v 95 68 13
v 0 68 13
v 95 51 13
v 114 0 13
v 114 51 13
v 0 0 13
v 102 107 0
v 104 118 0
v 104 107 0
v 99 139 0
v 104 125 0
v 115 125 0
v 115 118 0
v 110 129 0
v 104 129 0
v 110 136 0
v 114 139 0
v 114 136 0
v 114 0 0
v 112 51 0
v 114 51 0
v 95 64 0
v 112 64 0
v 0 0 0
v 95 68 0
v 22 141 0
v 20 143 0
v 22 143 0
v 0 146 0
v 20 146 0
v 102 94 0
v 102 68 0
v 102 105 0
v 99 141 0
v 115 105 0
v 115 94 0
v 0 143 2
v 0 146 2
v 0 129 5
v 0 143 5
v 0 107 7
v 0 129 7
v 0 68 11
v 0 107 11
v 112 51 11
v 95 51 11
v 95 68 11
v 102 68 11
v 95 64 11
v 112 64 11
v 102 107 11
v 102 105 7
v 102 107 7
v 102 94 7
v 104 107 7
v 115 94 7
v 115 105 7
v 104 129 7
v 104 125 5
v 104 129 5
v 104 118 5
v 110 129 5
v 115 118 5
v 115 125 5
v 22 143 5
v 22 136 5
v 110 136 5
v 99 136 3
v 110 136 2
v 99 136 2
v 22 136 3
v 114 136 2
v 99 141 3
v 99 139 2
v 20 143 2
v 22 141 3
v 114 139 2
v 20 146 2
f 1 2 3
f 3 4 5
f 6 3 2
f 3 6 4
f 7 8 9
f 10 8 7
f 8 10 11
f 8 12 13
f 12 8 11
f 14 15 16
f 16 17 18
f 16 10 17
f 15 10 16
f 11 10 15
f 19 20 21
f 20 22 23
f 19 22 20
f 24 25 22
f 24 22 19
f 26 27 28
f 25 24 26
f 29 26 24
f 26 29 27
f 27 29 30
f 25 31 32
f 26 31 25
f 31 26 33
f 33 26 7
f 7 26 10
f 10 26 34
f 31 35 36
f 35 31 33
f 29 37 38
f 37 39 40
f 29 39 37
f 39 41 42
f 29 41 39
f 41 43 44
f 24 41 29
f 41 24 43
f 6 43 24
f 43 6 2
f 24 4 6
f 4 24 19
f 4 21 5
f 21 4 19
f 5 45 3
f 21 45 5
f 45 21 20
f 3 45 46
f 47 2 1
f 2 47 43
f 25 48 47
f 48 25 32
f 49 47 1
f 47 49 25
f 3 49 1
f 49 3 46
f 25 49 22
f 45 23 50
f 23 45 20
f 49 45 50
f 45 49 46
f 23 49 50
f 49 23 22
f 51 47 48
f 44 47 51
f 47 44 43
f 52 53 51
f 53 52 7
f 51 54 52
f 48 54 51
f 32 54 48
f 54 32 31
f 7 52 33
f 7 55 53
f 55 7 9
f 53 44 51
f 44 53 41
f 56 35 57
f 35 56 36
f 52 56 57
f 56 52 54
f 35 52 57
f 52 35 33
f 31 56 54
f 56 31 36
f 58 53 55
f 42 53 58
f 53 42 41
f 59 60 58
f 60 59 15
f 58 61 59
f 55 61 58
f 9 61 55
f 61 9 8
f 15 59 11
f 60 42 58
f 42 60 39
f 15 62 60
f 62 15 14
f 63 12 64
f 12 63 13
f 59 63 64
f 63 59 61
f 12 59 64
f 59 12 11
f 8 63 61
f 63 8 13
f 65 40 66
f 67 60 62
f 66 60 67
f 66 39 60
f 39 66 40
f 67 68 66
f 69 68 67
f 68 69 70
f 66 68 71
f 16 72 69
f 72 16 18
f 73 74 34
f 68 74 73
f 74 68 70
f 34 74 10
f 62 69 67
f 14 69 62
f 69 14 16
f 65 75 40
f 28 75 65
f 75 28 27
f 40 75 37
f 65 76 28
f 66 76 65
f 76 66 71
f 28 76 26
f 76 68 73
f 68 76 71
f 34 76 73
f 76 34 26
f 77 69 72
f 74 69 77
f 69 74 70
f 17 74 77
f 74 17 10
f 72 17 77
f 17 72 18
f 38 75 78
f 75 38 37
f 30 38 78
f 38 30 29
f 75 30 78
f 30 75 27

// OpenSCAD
translate([9.5, 8.5, 6.5]) color([0.40341287658681757, 0.7785502590540477, 0.7881774252549901]) cube([19, 17, 13], center=true);
translate([28.5, 8.5, 6.5]) color([0.29225416811082217, 0.37180432355577453, 0.6288109059468862]) cube([19, 17, 13], center=true);
translate([47.5, 8.5, 6.5]) color([0.15706996711565713, 0.6970319309869248, 0.3814277529807131]) cube([19, 17, 13], center=true);
translate([66.5, 8.5, 6.5]) color([0.591062474757007, 0.1395330992312218, 0.6682583860975598]) cube([19, 17, 13], center=true);
translate([85.5, 8.5, 6.5]) color([0.3540578606136997, 0.4726655762072315, 0.4151074008495357]) cube([19, 17, 13], center=true);
translate([104.5, 8.5, 6.5]) color([0.47671524799509457, 0.6946956329164442, 0.31824017683207795]) cube([19, 17, 13], center=true);
translate([9.5, 25.5, 6.5]) color([0.6520544808985483, 0.060222107499701916, 0.3001851524622099]) cube([19, 17, 13], center=true);
translate([28.5, 25.5, 6.5]) color([0.7452096901500458, 0.05240587806206365, 0.6211421952822352]) cube([19, 17, 13], center=true);
translate([47.5, 25.5, 6.5]) color([0.025546799267838538, 0.4715288683099005, 0.8885450437134765]) cube([19, 17, 13], center=true);
translate([66.5, 25.5, 6.5]) color([0.010110093997603875, 0.5268280206539229, 0.06645682965886301]) cube([19, 17, 13], center=true);
translate([85.5, 25.5, 6.5]) color([0.8671097761494883, 0.6862965222396646, 0.7419538566814291]) cube([19, 17, 13], center=true);
translate([104.5, 25.5, 6.5]) color([0.669007579945888, 0.006423453698145676, 0.041177862257898545]) cube([19, 17, 13], center=true);
translate([9.5, 42.5, 6.5]) color([0.6208768040220466, 0.9996851255769114, 0.8731472390917929]) cube([19, 17, 13], center=true);
translate([28.5, 42.5, 6.5]) color([0.699685806725371, 0.7270999543422898, 0.2266870226016624]) cube([19, 17, 13], center=true);
translate([47.5, 42.5, 6.5]) color([0.751613934135812, 0.28792410486343756, 0.10546026702239297]) cube([19, 17, 13], center=true);
translate([66.5, 42.5, 6.5]) color([0.4608948954667579, 0.33019577252961807, 0.168255398651179]) cube([19, 17, 13], center=true);
translate([85.5, 42.5, 6.5]) color([0.42170989251140467, 0.8972009769638755, 0.4352702732981688]) cube([19, 17, 13], center=true);
translate([104.5, 42.5, 6.5]) color([0.4472918952497248, 0.708827757444238, 0.5241618701522923]) cube([19, 17, 13], center=true);
translate([9.5, 59.5, 6.5]) color([0.12922303534199353, 0.91039239754397, 0.4441243361619651]) cube([19, 17, 13], center=true);
translate([28.5, 59.5, 6.5]) color([0.7893377392253591, 0.38887513002224416, 0.806846018820692]) cube([19, 17, 13], center=true);
translate([47.5, 59.5, 6.5]) color([0.3895364160074527, 0.2201595216660458, 0.19619466691666865]) cube([19, 17, 13], center=true);
translate([66.5, 59.5, 6.5]) color([0.9400346443375104, 0.58653025858102, 0.04979326505826487]) cube([19, 17, 13], center=true);
translate([85.5, 59.5, 6.5]) color([0.38834759617804915, 0.234029260524927, 0.08465706460929934]) cube([19, 17, 13], center=true);
translate([103.5, 57.5, 5.5]) color([0.18675586852140846, 0.05699047999950346, 0.6380736282281027]) cube([17, 13, 11], center=true);
translate([8.5, 74.5, 5.5]) color([0.17337386483746886, 0.6107798762435255, 0.6125067478912297]) cube([17, 13, 11], center=true);
translate([25.5, 74.5, 5.5]) color([0.7049237107399368, 0.5121186506114312, 0.28442399033479826]) cube([17, 13, 11], center=true);
translate([42.5, 74.5, 5.5]) color([0.8774574539285279, 0.35307108172351365, 0.4582943249787391]) cube([17, 13, 11], center=true);
translate([59.5, 74.5, 5.5]) color([0.6318794317305464, 0.5161242981674495, 0.9564683485665337]) cube([17, 13, 11], center=true);
translate([76.5, 74.5, 5.5]) color([0.9547176774381221, 0.9297598506094263, 0.9340763496652581]) cube([17, 13, 11], center=true);
translate([93.5, 74.5, 5.5]) color([0.580960135568696, 0.49020206373000297, 0.7041168173823689]) cube([17, 13, 11], center=true);
translate([8.5, 87.5, 5.5]) color([0.21541959298546798, 0.26587203921552827, 0.04380725363309168]) cube([17, 13, 11], center=true);
translate([25.5, 87.5, 5.5]) color([0.16285754255803098, 0.0038745499388105342, 0.6546275765234981]) cube([17, 13, 11], center=true);
translate([42.5, 87.5, 5.5]) color([0.14040698903568194, 0.7866793455760521, 0.680503995881725]) cube([17, 13, 11], center=true);
translate([59.5, 87.5, 5.5]) color([0.9706757933544957, 0.3965144869518913, 0.9213919134510528]) cube([17, 13, 11], center=true);
translate([76.5, 87.5, 5.5]) color([0.4537041723195332, 0.3395037398362071, 0.10233886991705377]) cube([17, 13, 11], center=true);
translate([93.5, 87.5, 5.5]) color([0.8828321850718597, 0.7947901585625868, 0.3229289765350606]) cube([17, 13, 11], center=true);
translate([8.5, 100.5, 5.5]) color([0.45574438492562896, 0.32514346581324827, 0.028829116538094723]) cube([17, 13, 11], center=true);
translate([25.5, 100.5, 5.5]) color([0.04435252539911694, 0.3687041258820589, 0.20959132812878367]) cube([17, 13, 11], center=true);
translate([42.5, 100.5, 5.5]) color([0.5245146032105923, 0.1877850356496189, 0.2016215864664097]) cube([17, 13, 11], center=true);
translate([59.5, 100.5, 5.5]) color([0.6726678813176303, 0.7356026567617159, 0.31223209587410494]) cube([17, 13, 11], center=true);
translate([76.5, 100.5, 5.5]) color([0.8599943994333726, 0.2546391746557106, 0.34394037628155716]) cube([17, 13, 11], center=true);
translate([93.5, 100.5, 5.5]) color([0.712480390369609, 0.04450290132920964, 0.934183460116191]) cube([17, 13, 11], center=true);
translate([108.5, 99.5, 3.5]) color([0.07233773178762537, 0.4609310589380602, 0.7246048259600892]) cube([13, 11, 7], center=true);
translate([6.5, 112.5, 3.5]) color([0.04746853498479808, 0.8090026856371774, 0.9788933433114139]) cube([13, 11, 7], center=true);
translate([19.5, 112.5, 3.5]) color([0.460511672795628, 0.11812363628756806, 0.08147699565547994]) cube([13, 11, 7], center=true);
translate([32.5, 112.5, 3.5]) color([0.09873043616313526, 0.7654413741364753, 0.4140128484685186]) cube([13, 11, 7], center=true);
translate([45.5, 112.5, 3.5]) color([0.9192341581990311, 0.4406397760864845, 0.07714331014460807]) cube([13, 11, 7], center=true);
translate([58.5, 112.5, 3.5]) color([0.42693558751800065, 0.7548278934255565, 0.8293384268467949]) cube([13, 11, 7], center=true);
translate([71.5, 112.5, 3.5]) color([0.039351686529191854, 0.1803893912563338, 0.490013452023644]) cube([13, 11, 7], center=true);
translate([84.5, 112.5, 3.5]) color([0.12808547795160863, 0.8710926419421733, 0.9344608884461488]) cube([13, 11, 7], center=true);
translate([97.5, 112.5, 3.5]) color([0.3195969983538176, 0.43484368255202, 0.5570540644200566]) cube([13, 11, 7], center=true);
translate([6.5, 123.5, 3.5]) color([0.2855057910835891, 0.5410756974595614, 0.2011850454737838]) cube([13, 11, 7], center=true);
translate([19.5, 123.5, 3.5]) color([0.2966412512769129, 0.44178363318767744, 0.604669902191143]) cube([13, 11, 7], center=true);
translate([32.5, 123.5, 3.5]) color([0.5361650260862432, 0.2609879767339395, 0.23178787541805523]) cube([13, 11, 7], center=true);
translate([45.5, 123.5, 3.5]) color([0.11873023670071103, 0.7834936358921726, 0.09890076646638046]) cube([13, 11, 7], center=true);
translate([58.5, 123.5, 3.5]) color([0.7328850061793606, 0.2487736956630997, 0.28455698400578255]) cube([13, 11, 7], center=true);
translate([71.5, 123.5, 3.5]) color([0.7360834330107994, 0.6596207917216363, 0.7419215555155583]) cube([13, 11, 7], center=true);
translate([84.5, 123.5, 3.5]) color([0.5152830587943614, 0.8590958196652707, 0.12179389137547159]) cube([13, 11, 7], center=true);
translate([97.5, 123.5, 3.5]) color([0.6451969614065052, 0.11824431248865597, 0.7372833681454282]) cube([13, 11, 7], center=true);
translate([109.5, 121.5, 2.5]) color([0.3589046614584527, 0.67488210437111, 0.7034839134412817]) cube([11, 7, 5], center=true);
translate([5.5, 132.5, 2.5]) color([0.6606084576410584, 0.22155798032782648, 0.8317998863873537]) cube([11, 7, 5], center=true);
translate([16.5, 132.5, 2.5]) color([0.24013608742346748, 0.5181532972121122, 0.6746457541533513]) cube([11, 7, 5], center=true);
translate([27.5, 132.5, 2.5]) color([0.23360317478475656, 0.628511722983939, 0.2868310479973286]) cube([11, 7, 5], center=true);
translate([38.5, 132.5, 2.5]) color([0.1713823760843869, 0.809748828526577, 0.5531227700773604]) cube([11, 7, 5], center=true);
translate([49.5, 132.5, 2.5]) color([0.32788470660885605, 0.5854309472055399, 0.025286397427288332]) cube([11, 7, 5], center=true);
translate([60.5, 132.5, 2.5]) color([0.12982285676032723, 0.3955808516982431, 0.9757565794644123]) cube([11, 7, 5], center=true);
translate([71.5, 132.5, 2.5]) color([0.5104745178761232, 0.07645620506689521, 0.7650406152494567]) cube([11, 7, 5], center=true);
translate([82.5, 132.5, 2.5]) color([0.7814438709253152, 0.7748021743948562, 0.5694980380479538]) cube([11, 7, 5], center=true);
translate([93.5, 132.5, 2.5]) color([0.6956987378694627, 0.21345793631163135, 0.7325605908939883]) cube([11, 7, 5], center=true);
translate([104.5, 132.5, 2.5]) color([0.8161739873415944, 0.7599665402219192, 0.353462402585887]) cube([11, 7, 5], center=true);
translate([5.5, 139.5, 2.5]) color([0.5910280505757086, 0.6289893574898388, 0.9008098536570839]) cube([11, 7, 5], center=true);
translate([16.5, 139.5, 2.5]) color([0.1080138952733335, 0.8339337708504084, 0.5264355584690392]) cube([11, 7, 5], center=true);
translate([25.5, 138.5, 1.5]) color([0.3586141205519373, 0.4556029014937524, 0.012635498930738787]) cube([7, 5, 3], center=true);
translate([32.5, 138.5, 1.5]) color([0.22007359233142765, 0.6527634200680049, 0.660849279754449]) cube([7, 5, 3], center=true);
translate([39.5, 138.5, 1.5]) color([0.4946989402863131, 0.9533258805973196, 0.4809150885494712]) cube([7, 5, 3], center=true);
translate([46.5, 138.5, 1.5]) color([0.3139436595456605, 0.8477808391956414, 0.259158299397262]) cube([7, 5, 3], center=true);
translate([53.5, 138.5, 1.5]) color([0.6043059930343495, 0.7034188523223, 0.8216962986917842]) cube([7, 5, 3], center=true);
translate([60.5, 138.5, 1.5]) color([0.7853687501827489, 0.3840923305137113, 0.059180305962736934]) cube([7, 5, 3], center=true);
translate([67.5, 138.5, 1.5]) color([0.03828786548344276, 0.7264603879084595, 0.9616913814068508]) cube([7, 5, 3], center=true);
translate([74.5, 138.5, 1.5]) color([0.3431653742712939, 0.44119509807551416, 0.7257980157417766]) cube([7, 5, 3], center=true);
translate([81.5, 138.5, 1.5]) color([0.6578312458538799, 0.26010658848413604, 0.6715848457987025]) cube([7, 5, 3], center=true);
translate([88.5, 138.5, 1.5]) color([0.3049024195743838, 0.3563579065620385, 0.5395133052630944]) cube([7, 5, 3], center=true);
translate([95.5, 138.5, 1.5]) color([0.7323138239267305, 0.15121621156796483, 0.021987210892938758]) cube([7, 5, 3], center=true);
translate([101.5, 137.5, 1.0]) color([0.6278299544850219, 0.024564677785836264, 0.04496324071616853]) cube([5, 3, 2], center=true);
translate([106.5, 137.5, 1.0]) color([0.22577557672213355, 0.6538768733044555, 0.06654509768602879]) cube([5, 3, 2], center=true);
translate([111.5, 137.5, 1.0]) color([0.06240576762652772, 0.9720932443736168, 0.4226528937805498]) cube([5, 3, 2], center=true);
translate([2.5, 144.5, 1.0]) color([0.8924289339928592, 0.21652428395276402, 0.4352131794546169]) cube([5, 3, 2], center=true);
translate([7.5, 144.5, 1.0]) color([0.35803513461315506, 0.17693553603496914, 0.32881318575191665]) cube([5, 3, 2], center=true);
translate([12.5, 144.5, 1.0]) color([0.9867958186960467, 0.7473090097951195, 0.3826682791831585]) cube([5, 3, 2], center=true);
translate([17.5, 144.5, 1.0]) color([0.40928443439993156, 0.2637409011550663, 0.531336678598825]) cube([5, 3, 2], center=true);
